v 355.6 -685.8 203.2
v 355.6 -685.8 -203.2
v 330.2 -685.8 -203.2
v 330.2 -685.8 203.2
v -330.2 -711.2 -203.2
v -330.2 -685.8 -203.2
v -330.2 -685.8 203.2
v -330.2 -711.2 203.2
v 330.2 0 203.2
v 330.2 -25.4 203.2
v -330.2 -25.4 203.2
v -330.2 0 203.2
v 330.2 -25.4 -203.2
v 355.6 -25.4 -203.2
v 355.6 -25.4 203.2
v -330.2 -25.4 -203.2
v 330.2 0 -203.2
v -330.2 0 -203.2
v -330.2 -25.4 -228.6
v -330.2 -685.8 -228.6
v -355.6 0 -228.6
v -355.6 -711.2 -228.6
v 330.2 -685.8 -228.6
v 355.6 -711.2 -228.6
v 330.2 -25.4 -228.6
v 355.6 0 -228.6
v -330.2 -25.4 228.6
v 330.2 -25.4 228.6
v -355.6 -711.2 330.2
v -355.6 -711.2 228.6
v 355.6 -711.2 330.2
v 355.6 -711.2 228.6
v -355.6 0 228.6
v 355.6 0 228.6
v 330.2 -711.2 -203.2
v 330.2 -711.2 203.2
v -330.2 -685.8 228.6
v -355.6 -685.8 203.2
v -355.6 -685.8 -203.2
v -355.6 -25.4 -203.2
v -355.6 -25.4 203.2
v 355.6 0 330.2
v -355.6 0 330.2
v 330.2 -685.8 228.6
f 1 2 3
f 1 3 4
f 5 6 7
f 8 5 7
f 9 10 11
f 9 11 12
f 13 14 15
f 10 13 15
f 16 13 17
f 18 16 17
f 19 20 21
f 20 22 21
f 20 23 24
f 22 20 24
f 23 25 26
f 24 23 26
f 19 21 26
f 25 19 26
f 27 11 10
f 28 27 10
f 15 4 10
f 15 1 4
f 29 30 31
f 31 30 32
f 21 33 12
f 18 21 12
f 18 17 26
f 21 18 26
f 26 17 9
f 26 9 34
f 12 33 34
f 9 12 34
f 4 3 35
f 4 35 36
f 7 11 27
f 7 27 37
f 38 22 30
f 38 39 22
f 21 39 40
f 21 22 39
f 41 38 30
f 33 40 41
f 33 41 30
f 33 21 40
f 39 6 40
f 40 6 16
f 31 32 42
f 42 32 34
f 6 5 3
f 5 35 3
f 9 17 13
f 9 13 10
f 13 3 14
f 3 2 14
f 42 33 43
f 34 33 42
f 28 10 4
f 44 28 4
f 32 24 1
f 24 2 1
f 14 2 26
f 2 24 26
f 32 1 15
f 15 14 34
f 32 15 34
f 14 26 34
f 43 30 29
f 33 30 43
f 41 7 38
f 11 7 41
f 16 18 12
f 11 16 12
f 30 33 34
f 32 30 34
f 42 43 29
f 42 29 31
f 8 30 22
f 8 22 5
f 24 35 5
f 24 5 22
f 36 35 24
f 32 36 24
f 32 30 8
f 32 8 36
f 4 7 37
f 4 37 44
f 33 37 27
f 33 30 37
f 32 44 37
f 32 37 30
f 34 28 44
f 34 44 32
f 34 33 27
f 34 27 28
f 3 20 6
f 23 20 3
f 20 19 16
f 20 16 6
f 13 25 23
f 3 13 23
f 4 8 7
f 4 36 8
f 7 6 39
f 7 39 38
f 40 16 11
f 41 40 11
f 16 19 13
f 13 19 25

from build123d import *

# Parameters (mm, degrees)
F0_W     = 711.2
F0_H     = 457.2
F0_W_2   = 660.4
F0_H_2   = 406.4
F1_DEPTH = 711.2
F3_DEPTH = 711.2
F4_W     = 660.4
F4_H     = 406.4
F5_DEPTH = 711.201
F6_W     = 660.4
F6_H     = 660.4
F7_DEPTH = 457.2
F8_W     = 711.2
F8_H     = 711.2
F9_DEPTH = 101.6


with BuildPart() as f1:
    # F0 (on Front) → F1 (new body)
    with BuildSketch(Plane.XZ):
        Rectangle(F0_W, F0_H)
        Rectangle(F0_W_2, F0_H_2, mode=Mode.SUBTRACT)
    extrude(amount=F1_DEPTH)


with BuildPart() as f3:
    # F0 (on Front) → F3 (new body)
    with BuildSketch(Plane.XZ):
        Rectangle(F0_W, F0_H)
        Rectangle(F0_W_2, F0_H_2, mode=Mode.SUBTRACT)
    extrude(amount=F3_DEPTH)


with BuildPart() as f5_tool:
    # F4 (on face) → F5 (new body, through all)
    with BuildSketch(Plane.YZ.offset(355.6)):
        with Locations((-355.6, 0)):
            Rectangle(F4_W, F4_H)
    extrude(amount=-F5_DEPTH)


with BuildPart() as f1_1:
    add(f1.part)

    # F5: cut by f5_tool
    add(f5_tool.part, mode=Mode.SUBTRACT)


with BuildPart() as f3_1:
    add(f3.part)

    # F5: cut by f5_tool
    add(f5_tool.part, mode=Mode.SUBTRACT)


with BuildPart() as f7_tool:
    # F6 (on face) → F7 (new body, through all)
    with BuildSketch(Plane(origin=(0, 0, -228.6), x_dir=(1, 0, 0), z_dir=(0, 0, -1))):
        with Locations((0, 355.6)):
            Rectangle(F6_W, F6_H)
    extrude(amount=-F7_DEPTH)


with BuildPart() as f1_2:
    add(f1_1.part)

    # F7: cut by f7_tool
    add(f7_tool.part, mode=Mode.SUBTRACT)


with BuildPart() as f3_2:
    add(f3_1.part)

    # F7: cut by f7_tool
    add(f7_tool.part, mode=Mode.SUBTRACT)


with BuildPart() as f9:
    # F8 (on face) → F9 (new body)
    with BuildSketch(Plane.XY.offset(228.6)):
        with Locations((0, -355.6)):
            Rectangle(F8_W, F8_H)
    extrude(amount=F9_DEPTH)


solid = Compound([f1_2.part, f9.part])
